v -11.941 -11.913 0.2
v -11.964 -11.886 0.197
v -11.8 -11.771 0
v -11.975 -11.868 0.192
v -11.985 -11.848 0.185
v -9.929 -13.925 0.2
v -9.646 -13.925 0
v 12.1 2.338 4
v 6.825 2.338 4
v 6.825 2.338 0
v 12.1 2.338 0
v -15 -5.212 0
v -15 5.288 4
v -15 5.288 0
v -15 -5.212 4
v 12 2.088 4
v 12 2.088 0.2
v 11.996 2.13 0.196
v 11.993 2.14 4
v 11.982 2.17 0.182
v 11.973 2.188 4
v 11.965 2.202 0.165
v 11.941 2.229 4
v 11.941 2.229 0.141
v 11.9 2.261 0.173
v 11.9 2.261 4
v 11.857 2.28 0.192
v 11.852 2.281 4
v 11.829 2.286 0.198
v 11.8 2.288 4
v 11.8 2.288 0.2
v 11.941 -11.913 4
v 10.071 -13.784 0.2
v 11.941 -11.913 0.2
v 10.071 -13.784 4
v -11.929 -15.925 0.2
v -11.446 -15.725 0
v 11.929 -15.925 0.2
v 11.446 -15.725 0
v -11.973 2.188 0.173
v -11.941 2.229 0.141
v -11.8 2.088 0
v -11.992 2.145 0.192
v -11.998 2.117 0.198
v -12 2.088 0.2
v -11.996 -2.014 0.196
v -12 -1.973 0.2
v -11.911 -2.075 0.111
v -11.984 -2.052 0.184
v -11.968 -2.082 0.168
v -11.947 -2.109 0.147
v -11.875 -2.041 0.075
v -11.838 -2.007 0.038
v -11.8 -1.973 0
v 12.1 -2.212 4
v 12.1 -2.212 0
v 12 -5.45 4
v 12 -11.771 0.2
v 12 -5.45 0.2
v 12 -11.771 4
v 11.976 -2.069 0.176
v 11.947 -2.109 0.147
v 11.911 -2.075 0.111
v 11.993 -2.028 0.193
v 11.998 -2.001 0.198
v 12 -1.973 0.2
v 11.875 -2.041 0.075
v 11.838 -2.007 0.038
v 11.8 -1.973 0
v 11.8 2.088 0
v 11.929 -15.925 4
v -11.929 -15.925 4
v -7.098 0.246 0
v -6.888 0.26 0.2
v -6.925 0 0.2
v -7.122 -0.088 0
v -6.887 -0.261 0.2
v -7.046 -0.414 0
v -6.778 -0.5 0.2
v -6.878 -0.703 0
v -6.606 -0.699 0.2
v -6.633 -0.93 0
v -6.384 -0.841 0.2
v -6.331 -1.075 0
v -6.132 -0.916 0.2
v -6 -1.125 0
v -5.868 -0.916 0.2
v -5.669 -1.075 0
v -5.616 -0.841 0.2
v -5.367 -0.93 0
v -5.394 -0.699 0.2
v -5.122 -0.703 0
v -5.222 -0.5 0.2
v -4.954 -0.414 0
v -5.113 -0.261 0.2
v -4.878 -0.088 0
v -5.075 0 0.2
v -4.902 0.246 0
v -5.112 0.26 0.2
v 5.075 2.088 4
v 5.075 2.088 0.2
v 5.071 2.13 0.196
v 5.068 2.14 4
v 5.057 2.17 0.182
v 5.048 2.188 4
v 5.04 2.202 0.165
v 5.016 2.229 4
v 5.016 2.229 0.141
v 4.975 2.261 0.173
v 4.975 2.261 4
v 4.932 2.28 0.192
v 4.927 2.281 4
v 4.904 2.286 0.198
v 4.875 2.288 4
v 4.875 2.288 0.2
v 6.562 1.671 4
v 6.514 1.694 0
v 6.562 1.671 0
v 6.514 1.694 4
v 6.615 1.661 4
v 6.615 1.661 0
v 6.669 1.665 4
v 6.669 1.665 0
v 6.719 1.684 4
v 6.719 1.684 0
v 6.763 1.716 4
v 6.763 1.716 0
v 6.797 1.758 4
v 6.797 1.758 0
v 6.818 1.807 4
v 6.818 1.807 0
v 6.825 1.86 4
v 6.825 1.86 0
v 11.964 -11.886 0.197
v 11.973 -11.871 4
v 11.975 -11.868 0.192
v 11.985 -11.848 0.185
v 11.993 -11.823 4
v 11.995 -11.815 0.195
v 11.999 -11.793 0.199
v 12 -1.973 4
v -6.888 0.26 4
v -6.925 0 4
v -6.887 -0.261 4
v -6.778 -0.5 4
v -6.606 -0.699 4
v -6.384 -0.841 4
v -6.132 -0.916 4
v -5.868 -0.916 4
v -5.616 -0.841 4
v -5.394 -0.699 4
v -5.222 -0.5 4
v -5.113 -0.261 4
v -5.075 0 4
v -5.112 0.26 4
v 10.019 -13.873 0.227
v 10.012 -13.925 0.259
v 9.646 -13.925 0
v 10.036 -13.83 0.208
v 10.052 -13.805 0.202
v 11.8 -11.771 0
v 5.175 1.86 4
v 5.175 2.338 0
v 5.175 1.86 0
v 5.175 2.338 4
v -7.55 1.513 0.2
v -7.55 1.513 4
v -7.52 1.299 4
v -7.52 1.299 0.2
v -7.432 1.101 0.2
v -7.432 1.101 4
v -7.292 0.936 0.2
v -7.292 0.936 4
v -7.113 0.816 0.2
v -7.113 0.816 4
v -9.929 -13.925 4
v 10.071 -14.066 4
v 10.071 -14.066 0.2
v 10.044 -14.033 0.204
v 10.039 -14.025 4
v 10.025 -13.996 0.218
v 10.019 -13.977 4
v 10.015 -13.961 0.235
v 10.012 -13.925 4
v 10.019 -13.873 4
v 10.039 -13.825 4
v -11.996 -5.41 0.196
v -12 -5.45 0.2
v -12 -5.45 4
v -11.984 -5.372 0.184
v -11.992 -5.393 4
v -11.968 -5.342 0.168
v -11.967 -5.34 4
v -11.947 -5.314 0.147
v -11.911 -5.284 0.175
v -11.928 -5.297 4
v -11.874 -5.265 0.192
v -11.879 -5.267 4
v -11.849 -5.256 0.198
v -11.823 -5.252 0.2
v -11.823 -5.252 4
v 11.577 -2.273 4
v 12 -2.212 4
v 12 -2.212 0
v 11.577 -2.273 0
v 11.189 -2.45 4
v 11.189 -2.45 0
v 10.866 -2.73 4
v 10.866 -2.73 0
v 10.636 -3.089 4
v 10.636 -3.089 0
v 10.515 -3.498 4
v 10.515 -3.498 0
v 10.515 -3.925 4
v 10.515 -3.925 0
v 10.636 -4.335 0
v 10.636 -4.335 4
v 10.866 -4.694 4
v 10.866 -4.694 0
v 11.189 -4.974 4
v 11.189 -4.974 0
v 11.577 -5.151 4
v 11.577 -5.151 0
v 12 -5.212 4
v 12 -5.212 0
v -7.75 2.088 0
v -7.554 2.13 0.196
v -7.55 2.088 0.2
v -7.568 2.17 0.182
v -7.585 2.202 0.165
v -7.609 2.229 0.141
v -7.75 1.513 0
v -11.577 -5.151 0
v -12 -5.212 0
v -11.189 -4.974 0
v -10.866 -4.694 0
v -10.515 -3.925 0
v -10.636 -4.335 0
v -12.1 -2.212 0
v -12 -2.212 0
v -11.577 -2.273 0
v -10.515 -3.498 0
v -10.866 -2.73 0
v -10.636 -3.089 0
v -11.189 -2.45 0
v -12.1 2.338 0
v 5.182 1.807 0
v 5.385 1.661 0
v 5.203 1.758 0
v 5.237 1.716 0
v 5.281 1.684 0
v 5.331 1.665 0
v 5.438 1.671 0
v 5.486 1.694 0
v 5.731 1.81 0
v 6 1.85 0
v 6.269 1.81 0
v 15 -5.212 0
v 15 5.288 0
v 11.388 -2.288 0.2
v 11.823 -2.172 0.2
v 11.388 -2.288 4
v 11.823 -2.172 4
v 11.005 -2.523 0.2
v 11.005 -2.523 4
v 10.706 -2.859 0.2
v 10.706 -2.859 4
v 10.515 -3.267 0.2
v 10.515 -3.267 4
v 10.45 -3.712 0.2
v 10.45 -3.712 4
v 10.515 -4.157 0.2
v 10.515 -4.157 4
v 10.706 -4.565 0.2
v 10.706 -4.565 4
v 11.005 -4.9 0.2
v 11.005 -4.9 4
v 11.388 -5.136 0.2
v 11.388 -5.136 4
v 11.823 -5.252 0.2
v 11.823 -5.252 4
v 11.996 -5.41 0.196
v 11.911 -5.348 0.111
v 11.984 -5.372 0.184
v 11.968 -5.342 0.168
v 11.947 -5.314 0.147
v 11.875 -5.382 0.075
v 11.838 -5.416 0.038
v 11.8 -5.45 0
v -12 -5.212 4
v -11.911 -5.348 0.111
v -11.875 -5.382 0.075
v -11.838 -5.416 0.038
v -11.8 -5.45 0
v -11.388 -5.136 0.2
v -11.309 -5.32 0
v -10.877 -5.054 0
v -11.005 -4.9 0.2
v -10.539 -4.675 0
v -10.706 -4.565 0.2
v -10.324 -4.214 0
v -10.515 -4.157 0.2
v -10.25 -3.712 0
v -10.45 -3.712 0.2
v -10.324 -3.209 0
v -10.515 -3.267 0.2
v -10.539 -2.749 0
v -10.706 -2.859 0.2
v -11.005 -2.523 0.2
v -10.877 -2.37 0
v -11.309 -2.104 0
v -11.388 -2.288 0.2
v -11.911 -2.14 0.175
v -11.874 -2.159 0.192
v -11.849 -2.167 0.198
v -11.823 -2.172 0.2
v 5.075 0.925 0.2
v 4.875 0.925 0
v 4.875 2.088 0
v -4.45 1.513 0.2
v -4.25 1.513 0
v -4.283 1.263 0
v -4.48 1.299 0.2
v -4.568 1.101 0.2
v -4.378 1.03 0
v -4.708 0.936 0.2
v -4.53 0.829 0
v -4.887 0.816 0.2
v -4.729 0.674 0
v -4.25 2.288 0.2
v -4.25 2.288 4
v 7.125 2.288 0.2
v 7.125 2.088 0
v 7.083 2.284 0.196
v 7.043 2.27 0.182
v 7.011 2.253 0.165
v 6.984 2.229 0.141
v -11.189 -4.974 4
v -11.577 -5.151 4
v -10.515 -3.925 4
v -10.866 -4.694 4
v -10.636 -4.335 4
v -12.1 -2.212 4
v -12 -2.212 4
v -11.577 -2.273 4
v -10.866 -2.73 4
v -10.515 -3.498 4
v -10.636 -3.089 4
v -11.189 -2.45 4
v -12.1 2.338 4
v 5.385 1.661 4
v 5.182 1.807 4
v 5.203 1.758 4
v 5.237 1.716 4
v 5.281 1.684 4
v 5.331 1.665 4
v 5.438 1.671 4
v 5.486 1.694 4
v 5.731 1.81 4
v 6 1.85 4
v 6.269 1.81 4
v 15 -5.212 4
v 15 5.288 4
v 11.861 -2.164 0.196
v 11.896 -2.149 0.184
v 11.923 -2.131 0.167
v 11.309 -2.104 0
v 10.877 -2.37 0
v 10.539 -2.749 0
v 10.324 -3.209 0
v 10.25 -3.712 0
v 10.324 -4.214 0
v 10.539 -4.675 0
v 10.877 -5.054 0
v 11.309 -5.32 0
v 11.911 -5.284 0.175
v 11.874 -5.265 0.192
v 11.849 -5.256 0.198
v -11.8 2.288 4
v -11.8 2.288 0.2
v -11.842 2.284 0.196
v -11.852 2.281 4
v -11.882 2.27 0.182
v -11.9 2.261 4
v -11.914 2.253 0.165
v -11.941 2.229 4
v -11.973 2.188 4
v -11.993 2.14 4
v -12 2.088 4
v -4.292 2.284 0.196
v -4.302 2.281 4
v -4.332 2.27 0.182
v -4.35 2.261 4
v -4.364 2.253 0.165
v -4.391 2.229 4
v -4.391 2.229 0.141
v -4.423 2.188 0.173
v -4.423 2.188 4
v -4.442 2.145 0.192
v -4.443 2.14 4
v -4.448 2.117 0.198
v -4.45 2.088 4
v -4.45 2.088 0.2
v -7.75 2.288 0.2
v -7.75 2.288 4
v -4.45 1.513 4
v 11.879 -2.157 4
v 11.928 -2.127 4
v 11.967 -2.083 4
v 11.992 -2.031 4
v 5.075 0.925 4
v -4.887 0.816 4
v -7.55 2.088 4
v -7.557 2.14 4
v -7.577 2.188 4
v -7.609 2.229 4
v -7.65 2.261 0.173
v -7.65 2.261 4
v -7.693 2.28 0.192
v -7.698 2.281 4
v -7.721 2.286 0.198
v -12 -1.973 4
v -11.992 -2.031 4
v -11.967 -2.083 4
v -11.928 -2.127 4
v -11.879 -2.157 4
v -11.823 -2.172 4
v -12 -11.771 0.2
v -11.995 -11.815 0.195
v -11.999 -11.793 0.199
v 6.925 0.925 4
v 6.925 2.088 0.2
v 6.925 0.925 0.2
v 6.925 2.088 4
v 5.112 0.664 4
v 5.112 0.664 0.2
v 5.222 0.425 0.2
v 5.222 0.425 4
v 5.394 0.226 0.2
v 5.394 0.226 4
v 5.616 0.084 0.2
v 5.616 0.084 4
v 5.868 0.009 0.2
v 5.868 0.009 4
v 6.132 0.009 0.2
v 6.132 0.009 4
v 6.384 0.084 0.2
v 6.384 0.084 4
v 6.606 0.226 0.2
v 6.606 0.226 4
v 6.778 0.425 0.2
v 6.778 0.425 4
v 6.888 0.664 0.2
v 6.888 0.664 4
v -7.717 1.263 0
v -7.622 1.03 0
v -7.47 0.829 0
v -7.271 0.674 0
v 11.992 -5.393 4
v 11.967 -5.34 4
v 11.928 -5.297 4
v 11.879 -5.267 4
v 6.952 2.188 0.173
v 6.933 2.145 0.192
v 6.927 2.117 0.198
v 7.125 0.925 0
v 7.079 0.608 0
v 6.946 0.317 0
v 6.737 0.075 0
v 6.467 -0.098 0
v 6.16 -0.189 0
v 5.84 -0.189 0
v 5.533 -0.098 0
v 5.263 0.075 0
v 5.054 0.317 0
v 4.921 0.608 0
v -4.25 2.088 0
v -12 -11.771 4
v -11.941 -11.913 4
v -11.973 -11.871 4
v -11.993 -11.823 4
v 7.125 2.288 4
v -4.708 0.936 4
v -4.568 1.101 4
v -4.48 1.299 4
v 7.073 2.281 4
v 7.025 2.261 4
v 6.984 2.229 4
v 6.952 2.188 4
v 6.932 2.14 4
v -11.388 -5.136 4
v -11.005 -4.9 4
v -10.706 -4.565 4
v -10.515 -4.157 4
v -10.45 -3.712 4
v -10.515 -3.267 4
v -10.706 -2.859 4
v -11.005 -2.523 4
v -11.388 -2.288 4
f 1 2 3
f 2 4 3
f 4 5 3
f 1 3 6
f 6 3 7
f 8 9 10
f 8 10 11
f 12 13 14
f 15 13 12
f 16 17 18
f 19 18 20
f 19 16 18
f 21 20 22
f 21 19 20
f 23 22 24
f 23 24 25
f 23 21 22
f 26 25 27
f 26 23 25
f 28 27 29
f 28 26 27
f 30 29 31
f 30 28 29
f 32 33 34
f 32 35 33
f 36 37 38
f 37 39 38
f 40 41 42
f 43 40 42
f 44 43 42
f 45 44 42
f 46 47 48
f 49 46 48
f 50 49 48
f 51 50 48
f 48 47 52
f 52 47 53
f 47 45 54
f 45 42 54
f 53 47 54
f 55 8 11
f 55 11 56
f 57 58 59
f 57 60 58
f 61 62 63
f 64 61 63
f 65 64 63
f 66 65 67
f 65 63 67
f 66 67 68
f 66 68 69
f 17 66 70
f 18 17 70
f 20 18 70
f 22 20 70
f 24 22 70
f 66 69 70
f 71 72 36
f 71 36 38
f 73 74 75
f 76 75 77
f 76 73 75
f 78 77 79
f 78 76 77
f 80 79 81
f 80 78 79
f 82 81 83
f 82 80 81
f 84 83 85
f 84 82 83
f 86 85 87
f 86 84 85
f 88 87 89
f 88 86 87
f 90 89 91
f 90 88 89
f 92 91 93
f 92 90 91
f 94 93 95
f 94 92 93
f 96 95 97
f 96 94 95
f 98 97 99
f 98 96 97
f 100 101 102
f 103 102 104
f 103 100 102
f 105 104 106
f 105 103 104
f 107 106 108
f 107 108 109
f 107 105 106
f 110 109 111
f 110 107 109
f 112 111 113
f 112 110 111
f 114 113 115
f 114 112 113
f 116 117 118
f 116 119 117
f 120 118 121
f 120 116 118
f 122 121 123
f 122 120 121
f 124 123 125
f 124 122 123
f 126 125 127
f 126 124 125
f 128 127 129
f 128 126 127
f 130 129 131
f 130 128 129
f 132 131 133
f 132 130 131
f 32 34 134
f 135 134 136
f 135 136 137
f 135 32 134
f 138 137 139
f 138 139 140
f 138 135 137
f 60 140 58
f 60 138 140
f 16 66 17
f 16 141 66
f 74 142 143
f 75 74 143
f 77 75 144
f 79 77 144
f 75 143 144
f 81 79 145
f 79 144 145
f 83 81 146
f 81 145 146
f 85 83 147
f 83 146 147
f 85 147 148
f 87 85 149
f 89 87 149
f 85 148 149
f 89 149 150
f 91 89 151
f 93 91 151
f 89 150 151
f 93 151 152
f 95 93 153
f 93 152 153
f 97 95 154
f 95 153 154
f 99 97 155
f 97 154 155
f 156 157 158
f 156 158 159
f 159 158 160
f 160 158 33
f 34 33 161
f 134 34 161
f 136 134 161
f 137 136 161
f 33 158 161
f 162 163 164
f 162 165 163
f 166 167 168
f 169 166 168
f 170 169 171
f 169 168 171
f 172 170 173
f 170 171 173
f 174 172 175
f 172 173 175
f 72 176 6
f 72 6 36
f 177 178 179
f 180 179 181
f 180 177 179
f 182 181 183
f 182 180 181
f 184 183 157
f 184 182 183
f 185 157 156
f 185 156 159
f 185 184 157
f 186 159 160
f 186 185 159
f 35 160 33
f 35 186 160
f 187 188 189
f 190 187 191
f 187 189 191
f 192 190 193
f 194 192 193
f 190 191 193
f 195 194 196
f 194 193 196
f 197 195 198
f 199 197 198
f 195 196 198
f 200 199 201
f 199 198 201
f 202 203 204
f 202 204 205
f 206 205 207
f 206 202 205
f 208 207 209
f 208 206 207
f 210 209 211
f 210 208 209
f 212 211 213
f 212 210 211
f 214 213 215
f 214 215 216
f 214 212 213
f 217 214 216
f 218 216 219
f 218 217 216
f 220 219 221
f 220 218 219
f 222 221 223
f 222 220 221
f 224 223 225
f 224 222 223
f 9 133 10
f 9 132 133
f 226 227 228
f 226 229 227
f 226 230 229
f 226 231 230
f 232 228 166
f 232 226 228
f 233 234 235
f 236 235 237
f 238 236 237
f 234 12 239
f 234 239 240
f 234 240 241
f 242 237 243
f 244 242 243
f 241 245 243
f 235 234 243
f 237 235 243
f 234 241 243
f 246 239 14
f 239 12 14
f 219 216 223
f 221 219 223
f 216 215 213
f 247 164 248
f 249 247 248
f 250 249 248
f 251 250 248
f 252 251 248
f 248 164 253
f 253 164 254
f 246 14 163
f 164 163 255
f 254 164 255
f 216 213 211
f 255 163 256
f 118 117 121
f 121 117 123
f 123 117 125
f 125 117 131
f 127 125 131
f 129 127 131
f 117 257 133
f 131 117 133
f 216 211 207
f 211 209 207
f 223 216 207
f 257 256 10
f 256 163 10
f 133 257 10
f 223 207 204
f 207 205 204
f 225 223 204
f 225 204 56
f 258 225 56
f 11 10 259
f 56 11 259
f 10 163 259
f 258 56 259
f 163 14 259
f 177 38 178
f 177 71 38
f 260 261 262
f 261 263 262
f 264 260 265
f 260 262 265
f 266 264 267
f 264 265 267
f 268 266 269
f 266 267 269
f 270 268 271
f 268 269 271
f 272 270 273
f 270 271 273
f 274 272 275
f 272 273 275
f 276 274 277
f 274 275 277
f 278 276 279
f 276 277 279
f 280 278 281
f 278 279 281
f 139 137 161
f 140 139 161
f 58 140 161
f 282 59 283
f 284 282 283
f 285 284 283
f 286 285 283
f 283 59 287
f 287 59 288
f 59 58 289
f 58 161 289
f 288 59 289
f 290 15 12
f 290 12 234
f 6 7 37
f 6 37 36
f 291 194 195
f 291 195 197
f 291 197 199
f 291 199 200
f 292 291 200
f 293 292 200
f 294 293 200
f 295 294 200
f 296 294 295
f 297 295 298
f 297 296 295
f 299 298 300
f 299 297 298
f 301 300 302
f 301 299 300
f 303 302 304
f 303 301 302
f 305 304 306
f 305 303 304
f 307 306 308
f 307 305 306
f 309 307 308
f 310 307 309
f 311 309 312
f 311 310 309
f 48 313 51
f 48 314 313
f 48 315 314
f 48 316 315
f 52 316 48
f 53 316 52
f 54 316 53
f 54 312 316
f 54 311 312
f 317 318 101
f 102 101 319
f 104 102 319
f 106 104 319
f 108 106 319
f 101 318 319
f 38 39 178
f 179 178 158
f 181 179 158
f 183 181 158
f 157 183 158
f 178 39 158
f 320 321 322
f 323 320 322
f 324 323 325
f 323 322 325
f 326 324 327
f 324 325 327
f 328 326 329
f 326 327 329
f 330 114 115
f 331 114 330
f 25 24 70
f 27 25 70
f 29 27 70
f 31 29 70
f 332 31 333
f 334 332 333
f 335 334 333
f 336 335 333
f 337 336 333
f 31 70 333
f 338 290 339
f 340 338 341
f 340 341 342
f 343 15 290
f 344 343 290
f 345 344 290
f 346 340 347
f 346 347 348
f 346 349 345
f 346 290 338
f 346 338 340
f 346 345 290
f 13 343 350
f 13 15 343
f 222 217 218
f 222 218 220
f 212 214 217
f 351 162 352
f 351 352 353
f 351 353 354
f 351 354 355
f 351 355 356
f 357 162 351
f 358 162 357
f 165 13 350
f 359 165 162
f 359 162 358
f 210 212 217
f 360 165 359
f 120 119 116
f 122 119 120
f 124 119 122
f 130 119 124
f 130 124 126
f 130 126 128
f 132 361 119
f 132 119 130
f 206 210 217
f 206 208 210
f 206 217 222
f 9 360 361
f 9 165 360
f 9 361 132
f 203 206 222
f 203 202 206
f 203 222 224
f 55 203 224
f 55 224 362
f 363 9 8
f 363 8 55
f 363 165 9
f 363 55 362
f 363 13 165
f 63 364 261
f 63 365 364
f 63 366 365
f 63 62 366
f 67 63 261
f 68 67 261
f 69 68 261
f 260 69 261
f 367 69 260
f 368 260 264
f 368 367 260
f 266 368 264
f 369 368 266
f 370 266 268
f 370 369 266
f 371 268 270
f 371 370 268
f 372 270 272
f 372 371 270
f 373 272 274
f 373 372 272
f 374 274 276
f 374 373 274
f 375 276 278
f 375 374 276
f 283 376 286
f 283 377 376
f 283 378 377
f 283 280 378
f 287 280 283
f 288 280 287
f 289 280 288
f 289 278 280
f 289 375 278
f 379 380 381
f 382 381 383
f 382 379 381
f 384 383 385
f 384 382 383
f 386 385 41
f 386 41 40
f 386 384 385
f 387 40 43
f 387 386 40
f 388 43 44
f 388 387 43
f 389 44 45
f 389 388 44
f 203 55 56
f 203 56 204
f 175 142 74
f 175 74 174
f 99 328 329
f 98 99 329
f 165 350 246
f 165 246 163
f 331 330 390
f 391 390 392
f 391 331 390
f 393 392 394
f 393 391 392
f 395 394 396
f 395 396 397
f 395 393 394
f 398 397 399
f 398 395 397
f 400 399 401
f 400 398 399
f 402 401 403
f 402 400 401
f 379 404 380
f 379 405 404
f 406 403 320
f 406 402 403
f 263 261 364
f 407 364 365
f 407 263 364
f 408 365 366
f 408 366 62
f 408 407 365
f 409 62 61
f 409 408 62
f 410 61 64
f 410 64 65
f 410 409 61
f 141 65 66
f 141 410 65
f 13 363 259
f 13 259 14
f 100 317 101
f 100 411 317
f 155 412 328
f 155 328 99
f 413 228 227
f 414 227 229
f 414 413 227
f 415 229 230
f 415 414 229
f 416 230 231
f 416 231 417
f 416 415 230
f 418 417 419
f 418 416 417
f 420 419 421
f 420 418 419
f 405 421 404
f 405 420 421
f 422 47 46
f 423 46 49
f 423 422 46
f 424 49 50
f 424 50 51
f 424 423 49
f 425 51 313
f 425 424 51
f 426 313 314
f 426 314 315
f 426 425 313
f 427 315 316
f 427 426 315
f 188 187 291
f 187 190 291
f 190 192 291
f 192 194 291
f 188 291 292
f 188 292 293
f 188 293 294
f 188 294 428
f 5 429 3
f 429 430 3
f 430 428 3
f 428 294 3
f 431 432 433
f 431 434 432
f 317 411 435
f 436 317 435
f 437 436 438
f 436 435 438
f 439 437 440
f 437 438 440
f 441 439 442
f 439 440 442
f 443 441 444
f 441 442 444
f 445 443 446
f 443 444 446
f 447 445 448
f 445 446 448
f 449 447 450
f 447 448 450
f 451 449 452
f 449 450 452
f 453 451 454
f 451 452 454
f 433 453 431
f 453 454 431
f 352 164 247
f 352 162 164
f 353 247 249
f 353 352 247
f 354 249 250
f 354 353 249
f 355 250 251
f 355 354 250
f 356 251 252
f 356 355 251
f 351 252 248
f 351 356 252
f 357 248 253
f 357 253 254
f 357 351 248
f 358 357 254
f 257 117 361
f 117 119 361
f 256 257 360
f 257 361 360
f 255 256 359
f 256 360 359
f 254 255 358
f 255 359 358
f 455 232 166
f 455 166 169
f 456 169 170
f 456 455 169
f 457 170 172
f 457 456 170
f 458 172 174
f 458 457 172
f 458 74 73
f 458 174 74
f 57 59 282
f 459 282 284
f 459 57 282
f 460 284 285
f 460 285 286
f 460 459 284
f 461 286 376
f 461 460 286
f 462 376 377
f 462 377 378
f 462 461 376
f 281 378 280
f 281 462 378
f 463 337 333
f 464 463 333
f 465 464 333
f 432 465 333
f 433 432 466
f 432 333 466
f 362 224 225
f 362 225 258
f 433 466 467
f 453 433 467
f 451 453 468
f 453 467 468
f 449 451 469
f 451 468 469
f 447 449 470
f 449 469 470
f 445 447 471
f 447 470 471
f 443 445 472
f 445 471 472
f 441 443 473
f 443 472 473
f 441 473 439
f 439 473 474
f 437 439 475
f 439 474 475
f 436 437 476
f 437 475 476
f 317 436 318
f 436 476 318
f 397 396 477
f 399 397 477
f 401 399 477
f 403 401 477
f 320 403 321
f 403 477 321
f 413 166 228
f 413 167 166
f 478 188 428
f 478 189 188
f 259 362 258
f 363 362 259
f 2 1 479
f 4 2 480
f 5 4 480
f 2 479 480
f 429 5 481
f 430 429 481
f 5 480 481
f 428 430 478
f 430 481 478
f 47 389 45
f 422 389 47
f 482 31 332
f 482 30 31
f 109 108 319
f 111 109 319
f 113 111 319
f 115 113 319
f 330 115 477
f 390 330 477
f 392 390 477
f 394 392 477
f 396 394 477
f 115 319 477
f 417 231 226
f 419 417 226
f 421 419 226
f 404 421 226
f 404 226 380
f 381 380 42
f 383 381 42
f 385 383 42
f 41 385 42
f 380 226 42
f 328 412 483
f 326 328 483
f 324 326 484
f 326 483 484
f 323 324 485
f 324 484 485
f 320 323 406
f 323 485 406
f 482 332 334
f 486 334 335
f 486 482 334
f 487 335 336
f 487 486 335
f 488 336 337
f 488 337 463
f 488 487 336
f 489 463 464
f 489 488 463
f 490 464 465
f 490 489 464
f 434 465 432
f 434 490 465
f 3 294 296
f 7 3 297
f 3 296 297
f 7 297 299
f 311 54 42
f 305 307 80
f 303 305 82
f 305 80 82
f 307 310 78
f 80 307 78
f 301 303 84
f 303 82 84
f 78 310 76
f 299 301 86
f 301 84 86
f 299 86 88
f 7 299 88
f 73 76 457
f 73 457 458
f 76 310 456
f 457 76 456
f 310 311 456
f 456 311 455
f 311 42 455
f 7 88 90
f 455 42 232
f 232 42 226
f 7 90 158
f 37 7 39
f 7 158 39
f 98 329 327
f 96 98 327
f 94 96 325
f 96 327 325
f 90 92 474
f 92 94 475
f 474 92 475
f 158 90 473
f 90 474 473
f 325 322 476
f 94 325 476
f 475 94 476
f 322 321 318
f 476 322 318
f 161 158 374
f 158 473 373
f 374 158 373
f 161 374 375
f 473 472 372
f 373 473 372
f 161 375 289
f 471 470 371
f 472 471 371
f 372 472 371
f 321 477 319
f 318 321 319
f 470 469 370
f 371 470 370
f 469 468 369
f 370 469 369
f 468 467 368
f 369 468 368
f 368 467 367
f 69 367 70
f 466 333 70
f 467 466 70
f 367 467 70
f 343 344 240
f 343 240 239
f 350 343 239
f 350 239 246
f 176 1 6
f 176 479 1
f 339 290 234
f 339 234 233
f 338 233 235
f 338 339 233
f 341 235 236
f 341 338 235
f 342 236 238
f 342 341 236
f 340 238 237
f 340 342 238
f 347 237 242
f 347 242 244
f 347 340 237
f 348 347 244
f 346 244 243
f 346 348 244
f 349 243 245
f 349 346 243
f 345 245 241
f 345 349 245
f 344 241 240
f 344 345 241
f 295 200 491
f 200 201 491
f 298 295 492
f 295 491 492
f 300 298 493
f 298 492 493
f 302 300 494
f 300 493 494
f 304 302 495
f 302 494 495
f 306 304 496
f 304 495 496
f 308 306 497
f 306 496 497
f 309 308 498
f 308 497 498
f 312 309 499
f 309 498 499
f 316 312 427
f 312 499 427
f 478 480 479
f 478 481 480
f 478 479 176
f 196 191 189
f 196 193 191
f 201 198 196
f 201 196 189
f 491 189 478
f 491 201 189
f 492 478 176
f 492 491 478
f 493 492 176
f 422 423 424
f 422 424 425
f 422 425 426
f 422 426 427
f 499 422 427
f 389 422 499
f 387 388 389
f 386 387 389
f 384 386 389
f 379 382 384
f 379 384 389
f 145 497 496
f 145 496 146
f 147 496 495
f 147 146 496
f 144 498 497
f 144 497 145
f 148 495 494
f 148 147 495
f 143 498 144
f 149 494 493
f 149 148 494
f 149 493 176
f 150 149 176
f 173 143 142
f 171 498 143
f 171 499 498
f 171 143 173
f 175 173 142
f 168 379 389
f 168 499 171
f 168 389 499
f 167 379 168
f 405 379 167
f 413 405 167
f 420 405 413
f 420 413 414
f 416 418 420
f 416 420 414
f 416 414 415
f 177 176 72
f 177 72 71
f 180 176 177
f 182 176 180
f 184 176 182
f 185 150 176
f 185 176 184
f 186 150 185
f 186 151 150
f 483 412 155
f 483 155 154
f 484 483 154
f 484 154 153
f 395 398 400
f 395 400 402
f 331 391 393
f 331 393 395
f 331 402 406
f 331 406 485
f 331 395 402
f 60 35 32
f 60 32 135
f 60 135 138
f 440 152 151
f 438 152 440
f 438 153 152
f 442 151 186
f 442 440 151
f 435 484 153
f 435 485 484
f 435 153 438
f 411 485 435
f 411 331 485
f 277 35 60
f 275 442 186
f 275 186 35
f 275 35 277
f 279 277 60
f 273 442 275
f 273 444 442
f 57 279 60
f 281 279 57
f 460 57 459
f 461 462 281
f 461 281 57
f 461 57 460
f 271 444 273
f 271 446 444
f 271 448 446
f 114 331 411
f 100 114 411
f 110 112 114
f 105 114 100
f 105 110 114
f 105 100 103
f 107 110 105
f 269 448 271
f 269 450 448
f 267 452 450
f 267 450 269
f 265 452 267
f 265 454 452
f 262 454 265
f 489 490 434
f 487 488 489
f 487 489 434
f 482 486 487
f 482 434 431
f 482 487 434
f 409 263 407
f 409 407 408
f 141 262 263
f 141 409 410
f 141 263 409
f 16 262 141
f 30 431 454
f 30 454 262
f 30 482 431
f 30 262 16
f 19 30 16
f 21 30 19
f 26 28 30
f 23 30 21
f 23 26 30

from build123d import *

# Parameters (mm, degrees)
F3_SIZE = 0.2
F6_R    = 0.2
F6_2_R  = 0.2


with BuildPart() as f2:
    # F2: sweep along a path in F1
    with BuildLine(Plane.XZ) as f2_path:
        Line((0, 0), (0, 4))
    # F0 (on Top) → F2 (sweep)
    with BuildSketch(Plane.XY):
        with BuildLine():
            Line((-9.9292893219, -13.925), (-11.9292893219, -15.925))
            Line((-11.9292893219, -15.925), (11.9292893219, -15.925))
            Line((11.9292893219, -15.925), (9.9292893219, -13.925))
            Line((9.9292893219, -13.925), (12, -11.8542893219))
            Line((12, -11.8542893219), (12, -5.2619319249))
            ThreePointArc((12, -5.2619319249), (10.45, -3.7119319249), (12, -2.1619319249))
            Line((12, -2.1619319249), (12, 2.2880680751))
            Line((12, 2.2880680751), (6.925, 2.2880680751))
            Line((6.925, 2.2880680751), (6.925, 0.925))
            ThreePointArc((6.925, 0.925), (6, 0), (5.075, 0.925))
            Line((5.075, 0.925), (5.075, 2.2880680751))
            Line((5.075, 2.2880680751), (-4.45, 2.2880680751))
            Line((-4.45, 2.2880680751), (-4.45, 1.5130680751))
            ThreePointArc((-4.45, 1.5130680751), (-4.5683478452, 1.1014457391), (-4.8872463162, 0.8155385424))
            Line((-4.8872463162, 0.8155385424), (-5.1123254204, 0.2601131305))
            ThreePointArc((-5.1123254204, 0.2601131305), (-6, -0.925), (-6.8876745796, 0.2601131305))
            Line((-6.8876745796, 0.2601131305), (-7.1127536838, 0.8155385424))
            ThreePointArc((-7.1127536838, 0.8155385424), (-7.4316521548, 1.1014457391), (-7.55, 1.5130680751))
            Line((-7.55, 1.5130680751), (-7.55, 2.2880680751))
            Line((-7.55, 2.2880680751), (-12, 2.2880680751))
            Line((-12, 2.2880680751), (-12, -2.1619319249))
            ThreePointArc((-12, -2.1619319249), (-10.45, -3.7119319249), (-12, -5.2619319249))
            Line((-12, -5.2619319249), (-12, -11.8542893219))
            Line((-12, -11.8542893219), (-9.9292893219, -13.925))
        make_face()
    sweep(path=f2_path.line)

    # F3
    f3_edges = [f2.edges().sort_by_distance(p)[0] for p in [
        (-10.929289, -14.925, 0),
        (0, -15.925, 0),
        (10.929289, -14.925, 0),
        (10.964645, -12.889645, 0),
        (12, -8.558111, 0),
        (10.45, -3.711932, 0),
        (12, 0.063068, 0),
        (9.4625, 2.288068, 0),
        (6.925, 1.606534, 0),
        (6, 0, 0),
        (5.075, 1.606534, 0),
        (0.3125, 2.288068, 0),
        (-4.45, 1.900568, 0),
        (-4.568348, 1.101446, 0),
        (-4.999786, 0.537826, 0),
        (-6, -0.925, 0),
        (-7.000214, 0.537826, 0),
        (-7.431652, 1.101446, 0),
        (-7.55, 1.900568, 0),
        (-9.775, 2.288068, 0),
        (-12, 0.063068, 0),
        (-10.45, -3.711932, 0),
        (-12, -8.558111, 0),
        (-10.964645, -12.889645, 0),
    ]]
    chamfer(f3_edges, length=F3_SIZE)

    # F6
    f6_edges = [f2.edges().sort_by_distance(p)[0] for p in [
        (-12, -11.854289, 2.1),
        (12, 2.288068, 2.1),
        (-7.55, 2.288068, 2.1),
        (-4.45, 2.288068, 2.1),
        (5.075, 2.288068, 2.1),
        (6.925, 2.288068, 2.1),
        (-12, -2.161932, 2.1),
        (12, -5.261932, 2.1),
        (-12, -5.261932, 2.1),
        (9.929289, -13.925, 2.1),
        (12, -11.854289, 2.1),
        (12, -2.161932, 2.1),
        (-12, 2.288068, 2.1),
    ]]
    fillet(f6_edges, radius=F6_R)


with BuildPart() as f5:
    # F5: sweep along a path in F1
    with BuildLine(Plane.XZ) as f5_path:
        Line((0, 0), (0, 4))
    # F4 (on Top) → F5 (sweep)
    with BuildSketch(Plane.XY):
        with BuildLine():
            ThreePointArc((-12, -5.2119319249), (-10.5, -3.7119319249), (-12, -2.2119319249))
            Line((-12, -2.2119319249), (-12.1, -2.2119319249))
            Line((-12.1, -2.2119319249), (-12.1, 2.3380680751))
            Line((-12.1, 2.3380680751), (0, 2.3380680751))
            Line((0, 2.3380680751), (5.175, 2.3380680751))
            Line((5.175, 2.3380680751), (6.825, 2.3380680751))
            Line((6.825, 2.3380680751), (12.1, 2.3380680751))
            Line((12.1, 2.3380680751), (12.1, -2.2119319249))
            Line((12.1, -2.2119319249), (12, -2.2119319249))
            ThreePointArc((12, -2.2119319249), (10.5, -3.7119319249), (12, -5.2119319249))
            Line((12, -5.2119319249), (15, -5.2119319249))
            Line((15, -5.2119319249), (15, 5.2880680751))
            Line((15, 5.2880680751), (0, 5.2880680751))
            Line((0, 5.2880680751), (-15, 5.2880680751))
            Line((-15, 5.2880680751), (-15, -5.2119319249))
            Line((-15, -5.2119319249), (-12, -5.2119319249))
        make_face()
        with BuildLine():
            Line((6.825, 2.3380680751), (5.175, 2.3380680751))
            Line((5.175, 2.3380680751), (5.175, 1.3433300133))
            ThreePointArc((5.175, 1.3433300133), (6, 1.85), (6.825, 1.3433300133))
            Line((6.825, 1.3433300133), (6.825, 2.3380680751))
        make_face()
    sweep(path=f5_path.line)

    # F6#2
    f6_2_edges = [f5.edges().sort_by_distance(p)[0] for p in [
        (5.175, 1.34333, 2),
        (6.825, 1.34333, 2),
    ]]
    fillet(f6_2_edges, radius=F6_2_R)


solid = Compound([f2.part, f5.part])
